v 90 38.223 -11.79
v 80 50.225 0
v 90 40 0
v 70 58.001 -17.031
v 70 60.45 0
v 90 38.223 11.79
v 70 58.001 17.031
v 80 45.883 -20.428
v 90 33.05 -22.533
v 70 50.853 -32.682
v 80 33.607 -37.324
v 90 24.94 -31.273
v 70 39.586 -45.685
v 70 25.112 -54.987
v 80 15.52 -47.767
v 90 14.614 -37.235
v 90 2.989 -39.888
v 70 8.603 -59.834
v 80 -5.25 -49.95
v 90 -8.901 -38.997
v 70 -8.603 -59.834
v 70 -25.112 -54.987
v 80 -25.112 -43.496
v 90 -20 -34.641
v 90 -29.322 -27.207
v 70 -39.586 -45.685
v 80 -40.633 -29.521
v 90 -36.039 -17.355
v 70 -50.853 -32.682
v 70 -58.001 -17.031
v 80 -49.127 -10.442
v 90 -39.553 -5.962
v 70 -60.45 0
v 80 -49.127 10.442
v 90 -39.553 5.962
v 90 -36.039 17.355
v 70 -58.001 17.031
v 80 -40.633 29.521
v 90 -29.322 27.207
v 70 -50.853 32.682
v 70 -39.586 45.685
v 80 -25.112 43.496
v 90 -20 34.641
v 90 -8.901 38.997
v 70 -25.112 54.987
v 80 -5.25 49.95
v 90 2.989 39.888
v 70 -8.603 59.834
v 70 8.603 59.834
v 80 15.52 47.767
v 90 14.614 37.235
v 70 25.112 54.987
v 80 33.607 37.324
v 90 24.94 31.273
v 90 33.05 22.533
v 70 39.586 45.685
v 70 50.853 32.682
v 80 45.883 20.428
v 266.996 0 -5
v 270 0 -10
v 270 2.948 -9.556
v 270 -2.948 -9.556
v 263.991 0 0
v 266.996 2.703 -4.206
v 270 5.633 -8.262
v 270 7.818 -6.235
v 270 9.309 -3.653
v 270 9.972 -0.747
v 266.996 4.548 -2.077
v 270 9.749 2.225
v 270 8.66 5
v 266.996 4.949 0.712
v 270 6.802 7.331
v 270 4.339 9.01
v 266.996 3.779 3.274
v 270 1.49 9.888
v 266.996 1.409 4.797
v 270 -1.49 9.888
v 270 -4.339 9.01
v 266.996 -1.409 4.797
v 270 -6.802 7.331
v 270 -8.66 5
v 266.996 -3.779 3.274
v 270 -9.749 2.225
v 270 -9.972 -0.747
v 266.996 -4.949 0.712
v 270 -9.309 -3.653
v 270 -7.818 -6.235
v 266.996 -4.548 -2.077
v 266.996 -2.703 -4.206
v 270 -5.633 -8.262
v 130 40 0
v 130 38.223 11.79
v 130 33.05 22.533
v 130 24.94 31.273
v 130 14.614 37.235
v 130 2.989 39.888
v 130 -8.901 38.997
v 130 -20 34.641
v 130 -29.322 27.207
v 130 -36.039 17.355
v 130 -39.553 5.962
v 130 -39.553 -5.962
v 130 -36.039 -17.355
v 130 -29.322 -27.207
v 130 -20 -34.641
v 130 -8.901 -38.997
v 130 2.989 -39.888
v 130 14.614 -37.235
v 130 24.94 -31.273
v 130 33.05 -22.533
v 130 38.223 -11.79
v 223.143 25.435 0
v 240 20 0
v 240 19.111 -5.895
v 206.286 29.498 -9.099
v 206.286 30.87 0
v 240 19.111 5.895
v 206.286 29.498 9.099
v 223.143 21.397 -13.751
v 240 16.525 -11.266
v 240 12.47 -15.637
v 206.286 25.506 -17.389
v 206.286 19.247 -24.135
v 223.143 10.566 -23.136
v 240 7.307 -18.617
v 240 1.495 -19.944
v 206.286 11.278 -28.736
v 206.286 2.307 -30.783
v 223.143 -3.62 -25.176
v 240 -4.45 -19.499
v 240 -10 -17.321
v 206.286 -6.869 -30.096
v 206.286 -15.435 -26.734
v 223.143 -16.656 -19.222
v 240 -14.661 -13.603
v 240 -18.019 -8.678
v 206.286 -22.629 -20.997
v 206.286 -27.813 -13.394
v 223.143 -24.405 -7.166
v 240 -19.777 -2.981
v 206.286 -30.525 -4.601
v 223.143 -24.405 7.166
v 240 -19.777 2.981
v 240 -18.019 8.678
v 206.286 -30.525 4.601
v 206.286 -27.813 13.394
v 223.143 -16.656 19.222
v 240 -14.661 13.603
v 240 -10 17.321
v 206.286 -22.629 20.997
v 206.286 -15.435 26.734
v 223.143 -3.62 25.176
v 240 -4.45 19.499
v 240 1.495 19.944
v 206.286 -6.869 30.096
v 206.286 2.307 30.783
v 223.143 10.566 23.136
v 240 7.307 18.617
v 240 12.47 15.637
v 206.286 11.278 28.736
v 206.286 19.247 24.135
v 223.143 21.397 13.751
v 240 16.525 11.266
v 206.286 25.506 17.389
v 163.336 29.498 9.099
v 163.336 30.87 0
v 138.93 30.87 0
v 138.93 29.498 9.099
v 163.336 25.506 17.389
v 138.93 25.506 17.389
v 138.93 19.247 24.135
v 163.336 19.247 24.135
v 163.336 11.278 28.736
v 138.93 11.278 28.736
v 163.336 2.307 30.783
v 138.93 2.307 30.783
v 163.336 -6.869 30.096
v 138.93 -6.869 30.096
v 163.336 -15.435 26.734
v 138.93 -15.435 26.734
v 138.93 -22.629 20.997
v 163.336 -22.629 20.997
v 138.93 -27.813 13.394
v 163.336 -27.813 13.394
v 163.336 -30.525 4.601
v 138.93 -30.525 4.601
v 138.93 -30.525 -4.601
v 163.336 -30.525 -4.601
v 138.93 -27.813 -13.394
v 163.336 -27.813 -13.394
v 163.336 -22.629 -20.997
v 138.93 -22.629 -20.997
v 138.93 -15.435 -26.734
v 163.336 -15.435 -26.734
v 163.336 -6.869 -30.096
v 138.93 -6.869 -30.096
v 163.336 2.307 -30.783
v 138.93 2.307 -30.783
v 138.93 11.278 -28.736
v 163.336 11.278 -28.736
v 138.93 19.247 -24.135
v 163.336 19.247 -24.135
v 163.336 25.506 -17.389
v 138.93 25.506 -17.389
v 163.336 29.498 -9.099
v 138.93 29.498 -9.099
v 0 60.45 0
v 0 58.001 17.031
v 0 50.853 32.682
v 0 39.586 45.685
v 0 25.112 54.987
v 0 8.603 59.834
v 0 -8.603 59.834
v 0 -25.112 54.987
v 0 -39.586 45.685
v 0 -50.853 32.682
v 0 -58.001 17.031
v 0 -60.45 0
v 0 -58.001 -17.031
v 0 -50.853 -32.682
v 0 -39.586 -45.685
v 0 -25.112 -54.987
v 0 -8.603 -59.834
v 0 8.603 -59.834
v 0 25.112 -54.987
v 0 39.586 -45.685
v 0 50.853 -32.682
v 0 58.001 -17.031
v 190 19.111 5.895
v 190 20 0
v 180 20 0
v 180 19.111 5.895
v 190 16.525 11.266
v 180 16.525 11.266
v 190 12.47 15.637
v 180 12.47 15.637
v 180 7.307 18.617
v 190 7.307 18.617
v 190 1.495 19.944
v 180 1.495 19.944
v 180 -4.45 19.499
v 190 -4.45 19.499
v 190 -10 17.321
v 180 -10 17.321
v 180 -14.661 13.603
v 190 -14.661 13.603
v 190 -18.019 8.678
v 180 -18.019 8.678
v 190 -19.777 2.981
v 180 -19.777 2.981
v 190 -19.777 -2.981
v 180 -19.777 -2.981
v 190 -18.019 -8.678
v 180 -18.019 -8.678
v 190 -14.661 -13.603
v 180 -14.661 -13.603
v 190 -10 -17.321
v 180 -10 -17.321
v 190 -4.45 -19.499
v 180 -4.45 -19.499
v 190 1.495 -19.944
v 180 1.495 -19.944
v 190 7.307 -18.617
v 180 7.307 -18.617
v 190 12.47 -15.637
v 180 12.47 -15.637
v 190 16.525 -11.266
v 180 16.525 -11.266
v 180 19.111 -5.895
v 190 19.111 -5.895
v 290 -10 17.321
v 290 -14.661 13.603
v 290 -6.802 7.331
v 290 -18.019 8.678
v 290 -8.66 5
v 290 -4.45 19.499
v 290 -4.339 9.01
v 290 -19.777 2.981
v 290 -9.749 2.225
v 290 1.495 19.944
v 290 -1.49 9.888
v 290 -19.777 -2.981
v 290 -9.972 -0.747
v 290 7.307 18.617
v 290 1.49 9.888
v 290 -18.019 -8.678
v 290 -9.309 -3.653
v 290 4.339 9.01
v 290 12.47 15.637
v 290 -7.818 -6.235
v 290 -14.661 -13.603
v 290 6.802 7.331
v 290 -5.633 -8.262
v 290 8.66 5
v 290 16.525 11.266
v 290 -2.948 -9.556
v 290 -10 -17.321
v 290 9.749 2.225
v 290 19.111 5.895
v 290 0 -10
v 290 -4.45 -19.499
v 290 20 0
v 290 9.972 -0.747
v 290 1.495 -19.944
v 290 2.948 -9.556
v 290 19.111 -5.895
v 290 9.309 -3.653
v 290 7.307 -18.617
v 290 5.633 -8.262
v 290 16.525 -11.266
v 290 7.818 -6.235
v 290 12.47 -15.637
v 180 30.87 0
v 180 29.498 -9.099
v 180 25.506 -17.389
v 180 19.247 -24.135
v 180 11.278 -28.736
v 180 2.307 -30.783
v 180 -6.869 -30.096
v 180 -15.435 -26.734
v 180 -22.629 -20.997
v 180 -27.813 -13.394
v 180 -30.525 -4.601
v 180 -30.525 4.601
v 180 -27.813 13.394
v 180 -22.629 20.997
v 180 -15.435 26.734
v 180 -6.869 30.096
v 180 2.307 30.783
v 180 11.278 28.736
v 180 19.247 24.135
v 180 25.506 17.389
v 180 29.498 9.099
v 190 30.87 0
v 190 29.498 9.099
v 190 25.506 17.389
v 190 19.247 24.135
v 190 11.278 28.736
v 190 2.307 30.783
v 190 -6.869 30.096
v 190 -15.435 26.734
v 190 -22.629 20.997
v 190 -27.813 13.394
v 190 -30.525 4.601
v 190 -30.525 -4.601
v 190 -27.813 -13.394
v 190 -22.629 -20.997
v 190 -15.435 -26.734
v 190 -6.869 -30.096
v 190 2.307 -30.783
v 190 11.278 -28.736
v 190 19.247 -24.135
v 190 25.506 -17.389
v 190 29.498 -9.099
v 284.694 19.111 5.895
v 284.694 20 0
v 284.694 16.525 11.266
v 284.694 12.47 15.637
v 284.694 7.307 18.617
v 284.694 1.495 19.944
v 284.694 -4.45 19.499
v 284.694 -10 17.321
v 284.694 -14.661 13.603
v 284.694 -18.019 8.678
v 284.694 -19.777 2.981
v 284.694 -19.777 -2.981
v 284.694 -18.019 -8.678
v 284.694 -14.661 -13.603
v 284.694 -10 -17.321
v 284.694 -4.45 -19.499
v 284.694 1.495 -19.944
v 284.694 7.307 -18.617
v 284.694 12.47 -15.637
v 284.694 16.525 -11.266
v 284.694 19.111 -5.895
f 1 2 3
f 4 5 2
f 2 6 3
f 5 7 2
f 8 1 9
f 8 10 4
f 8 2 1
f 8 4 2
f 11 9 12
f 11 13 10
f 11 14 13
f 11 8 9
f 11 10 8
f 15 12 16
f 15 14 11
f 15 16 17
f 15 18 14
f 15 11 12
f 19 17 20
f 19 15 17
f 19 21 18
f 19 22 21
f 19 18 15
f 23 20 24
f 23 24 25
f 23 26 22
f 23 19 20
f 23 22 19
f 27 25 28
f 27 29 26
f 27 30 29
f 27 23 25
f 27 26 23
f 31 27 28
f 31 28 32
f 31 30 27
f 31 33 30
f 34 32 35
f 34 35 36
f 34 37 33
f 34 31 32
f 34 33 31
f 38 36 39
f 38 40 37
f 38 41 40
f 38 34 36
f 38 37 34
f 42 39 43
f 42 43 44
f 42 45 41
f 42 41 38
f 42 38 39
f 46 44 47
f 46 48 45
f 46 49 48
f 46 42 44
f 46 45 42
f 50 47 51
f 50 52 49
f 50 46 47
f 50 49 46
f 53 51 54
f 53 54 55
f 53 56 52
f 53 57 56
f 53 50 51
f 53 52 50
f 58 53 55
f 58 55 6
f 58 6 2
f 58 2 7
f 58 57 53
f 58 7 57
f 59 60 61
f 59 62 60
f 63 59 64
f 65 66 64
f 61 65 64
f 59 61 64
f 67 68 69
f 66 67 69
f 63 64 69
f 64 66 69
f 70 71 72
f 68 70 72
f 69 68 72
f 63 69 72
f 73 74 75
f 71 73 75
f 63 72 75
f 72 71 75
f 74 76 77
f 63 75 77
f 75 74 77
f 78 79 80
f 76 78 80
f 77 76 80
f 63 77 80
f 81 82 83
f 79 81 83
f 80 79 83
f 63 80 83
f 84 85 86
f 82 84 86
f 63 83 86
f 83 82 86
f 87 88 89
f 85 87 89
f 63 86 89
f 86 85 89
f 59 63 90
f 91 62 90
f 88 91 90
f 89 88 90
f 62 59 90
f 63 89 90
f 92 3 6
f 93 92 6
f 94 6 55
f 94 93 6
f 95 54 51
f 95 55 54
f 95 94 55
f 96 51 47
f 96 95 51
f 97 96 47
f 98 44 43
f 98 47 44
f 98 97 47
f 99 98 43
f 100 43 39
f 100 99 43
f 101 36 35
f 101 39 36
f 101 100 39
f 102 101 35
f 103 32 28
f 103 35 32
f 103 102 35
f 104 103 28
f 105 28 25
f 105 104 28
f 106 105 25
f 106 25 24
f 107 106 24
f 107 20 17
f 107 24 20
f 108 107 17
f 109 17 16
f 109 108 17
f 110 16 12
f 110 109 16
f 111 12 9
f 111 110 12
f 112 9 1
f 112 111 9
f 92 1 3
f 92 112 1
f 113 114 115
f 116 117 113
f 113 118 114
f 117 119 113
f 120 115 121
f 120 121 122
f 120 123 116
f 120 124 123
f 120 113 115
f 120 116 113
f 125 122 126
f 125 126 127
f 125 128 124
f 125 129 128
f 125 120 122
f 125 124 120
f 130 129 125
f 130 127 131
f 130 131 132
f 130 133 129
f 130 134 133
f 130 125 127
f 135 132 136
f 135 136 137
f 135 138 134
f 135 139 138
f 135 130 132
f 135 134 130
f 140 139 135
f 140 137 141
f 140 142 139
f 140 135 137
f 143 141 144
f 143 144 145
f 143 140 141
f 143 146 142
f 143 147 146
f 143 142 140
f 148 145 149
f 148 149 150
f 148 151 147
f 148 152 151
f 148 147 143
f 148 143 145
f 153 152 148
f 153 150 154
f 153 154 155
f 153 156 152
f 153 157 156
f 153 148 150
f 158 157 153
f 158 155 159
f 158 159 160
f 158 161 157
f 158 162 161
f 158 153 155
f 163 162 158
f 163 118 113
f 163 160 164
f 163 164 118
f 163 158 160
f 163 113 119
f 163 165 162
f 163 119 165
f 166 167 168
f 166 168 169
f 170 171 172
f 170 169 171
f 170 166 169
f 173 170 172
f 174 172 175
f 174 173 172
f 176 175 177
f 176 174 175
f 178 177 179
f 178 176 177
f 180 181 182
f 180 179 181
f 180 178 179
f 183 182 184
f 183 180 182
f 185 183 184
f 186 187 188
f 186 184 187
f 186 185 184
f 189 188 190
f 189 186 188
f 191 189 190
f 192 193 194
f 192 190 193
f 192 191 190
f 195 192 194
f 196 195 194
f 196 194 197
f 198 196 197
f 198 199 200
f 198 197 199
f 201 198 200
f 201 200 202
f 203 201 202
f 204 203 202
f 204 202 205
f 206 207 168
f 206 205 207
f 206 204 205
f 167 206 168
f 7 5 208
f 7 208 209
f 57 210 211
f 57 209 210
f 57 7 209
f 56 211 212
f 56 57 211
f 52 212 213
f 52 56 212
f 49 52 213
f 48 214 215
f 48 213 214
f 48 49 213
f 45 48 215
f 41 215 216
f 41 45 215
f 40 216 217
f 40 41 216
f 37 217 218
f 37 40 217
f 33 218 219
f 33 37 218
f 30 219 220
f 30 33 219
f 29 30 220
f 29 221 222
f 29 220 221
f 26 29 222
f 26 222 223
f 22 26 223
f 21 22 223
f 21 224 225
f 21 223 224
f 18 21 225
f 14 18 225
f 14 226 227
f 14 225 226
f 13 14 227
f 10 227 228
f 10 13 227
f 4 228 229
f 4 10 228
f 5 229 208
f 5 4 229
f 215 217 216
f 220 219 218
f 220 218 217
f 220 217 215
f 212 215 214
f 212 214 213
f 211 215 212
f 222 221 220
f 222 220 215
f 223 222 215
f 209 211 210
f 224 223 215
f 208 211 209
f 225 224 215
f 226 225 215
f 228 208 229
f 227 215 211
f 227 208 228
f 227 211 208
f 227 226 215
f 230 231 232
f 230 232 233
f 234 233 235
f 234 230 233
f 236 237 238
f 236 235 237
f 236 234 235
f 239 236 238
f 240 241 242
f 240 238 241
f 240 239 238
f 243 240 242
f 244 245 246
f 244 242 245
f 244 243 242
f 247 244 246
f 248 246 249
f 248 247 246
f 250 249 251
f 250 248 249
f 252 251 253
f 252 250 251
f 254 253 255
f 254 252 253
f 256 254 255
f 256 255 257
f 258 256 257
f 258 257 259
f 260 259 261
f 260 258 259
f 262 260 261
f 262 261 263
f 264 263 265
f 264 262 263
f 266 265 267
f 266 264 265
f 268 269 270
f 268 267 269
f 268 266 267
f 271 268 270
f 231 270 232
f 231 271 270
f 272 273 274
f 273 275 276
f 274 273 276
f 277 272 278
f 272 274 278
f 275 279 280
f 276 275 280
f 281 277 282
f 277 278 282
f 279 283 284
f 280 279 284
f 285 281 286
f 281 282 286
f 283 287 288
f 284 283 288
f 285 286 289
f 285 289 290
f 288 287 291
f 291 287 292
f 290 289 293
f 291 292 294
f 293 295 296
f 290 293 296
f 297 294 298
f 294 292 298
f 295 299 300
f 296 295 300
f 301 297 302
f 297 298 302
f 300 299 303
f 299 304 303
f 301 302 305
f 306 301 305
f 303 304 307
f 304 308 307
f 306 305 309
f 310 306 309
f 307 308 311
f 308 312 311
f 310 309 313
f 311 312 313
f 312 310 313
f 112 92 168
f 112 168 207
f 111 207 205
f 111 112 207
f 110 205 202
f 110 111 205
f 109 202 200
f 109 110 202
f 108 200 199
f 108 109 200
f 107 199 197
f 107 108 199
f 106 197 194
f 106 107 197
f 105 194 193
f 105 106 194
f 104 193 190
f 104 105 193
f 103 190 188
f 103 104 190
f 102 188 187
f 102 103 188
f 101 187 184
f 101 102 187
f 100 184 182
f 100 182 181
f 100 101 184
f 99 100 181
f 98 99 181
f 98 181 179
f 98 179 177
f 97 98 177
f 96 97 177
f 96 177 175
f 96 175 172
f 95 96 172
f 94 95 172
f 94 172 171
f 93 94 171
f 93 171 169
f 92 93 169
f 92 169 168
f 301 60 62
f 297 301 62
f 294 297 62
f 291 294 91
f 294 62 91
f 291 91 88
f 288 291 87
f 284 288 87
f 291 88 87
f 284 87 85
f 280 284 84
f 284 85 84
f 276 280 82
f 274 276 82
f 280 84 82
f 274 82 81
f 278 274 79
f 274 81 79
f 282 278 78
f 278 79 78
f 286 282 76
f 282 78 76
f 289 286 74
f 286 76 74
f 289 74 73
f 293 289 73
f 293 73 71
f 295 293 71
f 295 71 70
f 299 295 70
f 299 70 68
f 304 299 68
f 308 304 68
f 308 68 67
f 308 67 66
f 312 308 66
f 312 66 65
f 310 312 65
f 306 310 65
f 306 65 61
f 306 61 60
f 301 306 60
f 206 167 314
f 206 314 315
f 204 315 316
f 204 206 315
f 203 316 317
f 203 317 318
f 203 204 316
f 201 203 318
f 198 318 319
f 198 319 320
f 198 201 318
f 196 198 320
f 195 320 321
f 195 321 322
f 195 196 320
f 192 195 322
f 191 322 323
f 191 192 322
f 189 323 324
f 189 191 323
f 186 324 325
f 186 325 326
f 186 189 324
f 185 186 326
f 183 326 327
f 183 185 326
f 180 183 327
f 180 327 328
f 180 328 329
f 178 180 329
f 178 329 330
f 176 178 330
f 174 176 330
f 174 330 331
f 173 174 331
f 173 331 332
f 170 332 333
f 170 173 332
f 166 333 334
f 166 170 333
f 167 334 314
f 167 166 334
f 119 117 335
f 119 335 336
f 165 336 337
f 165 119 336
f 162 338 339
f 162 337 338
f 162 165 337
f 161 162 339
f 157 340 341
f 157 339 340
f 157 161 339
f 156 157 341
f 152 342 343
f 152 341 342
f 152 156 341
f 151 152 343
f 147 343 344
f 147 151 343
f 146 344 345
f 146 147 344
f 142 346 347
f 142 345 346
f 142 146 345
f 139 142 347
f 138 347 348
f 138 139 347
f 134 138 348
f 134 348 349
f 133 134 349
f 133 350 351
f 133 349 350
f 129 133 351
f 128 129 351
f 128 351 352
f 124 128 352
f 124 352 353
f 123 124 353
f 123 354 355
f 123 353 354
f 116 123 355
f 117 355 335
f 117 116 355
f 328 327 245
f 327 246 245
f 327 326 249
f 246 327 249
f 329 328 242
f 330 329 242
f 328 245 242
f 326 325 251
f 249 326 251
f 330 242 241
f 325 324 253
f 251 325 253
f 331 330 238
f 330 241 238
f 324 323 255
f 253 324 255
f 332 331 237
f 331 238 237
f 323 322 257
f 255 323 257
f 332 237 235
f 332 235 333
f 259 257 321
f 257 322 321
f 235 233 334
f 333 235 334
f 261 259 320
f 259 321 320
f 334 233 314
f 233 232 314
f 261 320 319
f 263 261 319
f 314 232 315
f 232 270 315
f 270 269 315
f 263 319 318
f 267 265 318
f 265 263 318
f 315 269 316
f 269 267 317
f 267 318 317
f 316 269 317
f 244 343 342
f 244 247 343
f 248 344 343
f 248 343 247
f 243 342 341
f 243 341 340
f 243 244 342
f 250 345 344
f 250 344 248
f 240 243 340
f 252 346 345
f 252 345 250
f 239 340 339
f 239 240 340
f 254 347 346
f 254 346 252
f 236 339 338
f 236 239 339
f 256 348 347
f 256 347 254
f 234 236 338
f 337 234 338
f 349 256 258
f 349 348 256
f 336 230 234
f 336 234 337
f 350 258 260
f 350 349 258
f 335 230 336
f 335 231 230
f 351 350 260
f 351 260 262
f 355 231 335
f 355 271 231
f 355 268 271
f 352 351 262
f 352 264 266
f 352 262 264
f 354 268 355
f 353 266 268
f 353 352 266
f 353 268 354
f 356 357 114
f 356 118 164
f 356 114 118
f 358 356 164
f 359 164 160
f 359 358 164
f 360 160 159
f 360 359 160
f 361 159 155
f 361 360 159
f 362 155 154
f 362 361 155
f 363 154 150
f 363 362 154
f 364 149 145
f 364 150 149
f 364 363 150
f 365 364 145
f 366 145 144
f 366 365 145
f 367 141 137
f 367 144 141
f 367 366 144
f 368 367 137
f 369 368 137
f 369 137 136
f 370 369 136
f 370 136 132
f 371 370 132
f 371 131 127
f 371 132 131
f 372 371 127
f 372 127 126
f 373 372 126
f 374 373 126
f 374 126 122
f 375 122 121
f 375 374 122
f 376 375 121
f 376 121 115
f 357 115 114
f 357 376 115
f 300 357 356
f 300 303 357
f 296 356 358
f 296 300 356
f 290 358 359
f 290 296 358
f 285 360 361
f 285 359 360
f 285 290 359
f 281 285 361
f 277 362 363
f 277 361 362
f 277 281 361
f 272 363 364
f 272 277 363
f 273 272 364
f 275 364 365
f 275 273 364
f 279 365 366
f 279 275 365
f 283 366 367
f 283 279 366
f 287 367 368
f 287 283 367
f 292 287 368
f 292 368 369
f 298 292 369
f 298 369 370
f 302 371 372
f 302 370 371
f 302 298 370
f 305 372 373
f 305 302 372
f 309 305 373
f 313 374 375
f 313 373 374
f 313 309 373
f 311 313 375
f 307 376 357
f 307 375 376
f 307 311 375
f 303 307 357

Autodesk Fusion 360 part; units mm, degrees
sketch "Sketch1" plane through (0, 0, 0) normal (0, 0, 1) x (1, 0, 0)
  line L0 (0, 0) -> (0, 60.4496)
  line L1 (0, 60.4496) -> (70, 60.4496)
  line L2 (70, 60.4496) -> (90, 40)
  line L3 (90, 40) -> (130, 40)
  line L4 (130, 40) -> (138.9297, 30.8696)
  line L5 (138.9297, 30.8696) -> (163.3358, 30.8696)
  line L6 (200, 0) -> (0, 0)
  line L7 (260, 0) -> (200, 0)
  line L8 (180, 20) -> (190, 20)
  line L9 (190, 20) -> (190, 30.8696)
  line L10 (190, 30.8696) -> (206.2856, 30.8696)
  line L11 (206.2856, 30.8696) -> (240, 20)
  line L12 (240, 20) -> (284.6944, 20)
  line L13 (284.6944, 20) -> (290, 20)
  line L14 (260, 0) -> (290, 0)
  line L15 (290, 0) -> (290, 20)
  line L16 (180, 20) -> (180, 30.8696)
  line L17 (180, 30.8696) -> (163.3358, 30.8696)
revolve "Revolve1" add sketch "Sketch1" angle 360 about axis through (260, 0, 0) along (-1, 0, 0)
hole "Hole1" at (290, 0, 0) direction (-1, 0, 0) diameter 20 depth 20 tip angle 118
